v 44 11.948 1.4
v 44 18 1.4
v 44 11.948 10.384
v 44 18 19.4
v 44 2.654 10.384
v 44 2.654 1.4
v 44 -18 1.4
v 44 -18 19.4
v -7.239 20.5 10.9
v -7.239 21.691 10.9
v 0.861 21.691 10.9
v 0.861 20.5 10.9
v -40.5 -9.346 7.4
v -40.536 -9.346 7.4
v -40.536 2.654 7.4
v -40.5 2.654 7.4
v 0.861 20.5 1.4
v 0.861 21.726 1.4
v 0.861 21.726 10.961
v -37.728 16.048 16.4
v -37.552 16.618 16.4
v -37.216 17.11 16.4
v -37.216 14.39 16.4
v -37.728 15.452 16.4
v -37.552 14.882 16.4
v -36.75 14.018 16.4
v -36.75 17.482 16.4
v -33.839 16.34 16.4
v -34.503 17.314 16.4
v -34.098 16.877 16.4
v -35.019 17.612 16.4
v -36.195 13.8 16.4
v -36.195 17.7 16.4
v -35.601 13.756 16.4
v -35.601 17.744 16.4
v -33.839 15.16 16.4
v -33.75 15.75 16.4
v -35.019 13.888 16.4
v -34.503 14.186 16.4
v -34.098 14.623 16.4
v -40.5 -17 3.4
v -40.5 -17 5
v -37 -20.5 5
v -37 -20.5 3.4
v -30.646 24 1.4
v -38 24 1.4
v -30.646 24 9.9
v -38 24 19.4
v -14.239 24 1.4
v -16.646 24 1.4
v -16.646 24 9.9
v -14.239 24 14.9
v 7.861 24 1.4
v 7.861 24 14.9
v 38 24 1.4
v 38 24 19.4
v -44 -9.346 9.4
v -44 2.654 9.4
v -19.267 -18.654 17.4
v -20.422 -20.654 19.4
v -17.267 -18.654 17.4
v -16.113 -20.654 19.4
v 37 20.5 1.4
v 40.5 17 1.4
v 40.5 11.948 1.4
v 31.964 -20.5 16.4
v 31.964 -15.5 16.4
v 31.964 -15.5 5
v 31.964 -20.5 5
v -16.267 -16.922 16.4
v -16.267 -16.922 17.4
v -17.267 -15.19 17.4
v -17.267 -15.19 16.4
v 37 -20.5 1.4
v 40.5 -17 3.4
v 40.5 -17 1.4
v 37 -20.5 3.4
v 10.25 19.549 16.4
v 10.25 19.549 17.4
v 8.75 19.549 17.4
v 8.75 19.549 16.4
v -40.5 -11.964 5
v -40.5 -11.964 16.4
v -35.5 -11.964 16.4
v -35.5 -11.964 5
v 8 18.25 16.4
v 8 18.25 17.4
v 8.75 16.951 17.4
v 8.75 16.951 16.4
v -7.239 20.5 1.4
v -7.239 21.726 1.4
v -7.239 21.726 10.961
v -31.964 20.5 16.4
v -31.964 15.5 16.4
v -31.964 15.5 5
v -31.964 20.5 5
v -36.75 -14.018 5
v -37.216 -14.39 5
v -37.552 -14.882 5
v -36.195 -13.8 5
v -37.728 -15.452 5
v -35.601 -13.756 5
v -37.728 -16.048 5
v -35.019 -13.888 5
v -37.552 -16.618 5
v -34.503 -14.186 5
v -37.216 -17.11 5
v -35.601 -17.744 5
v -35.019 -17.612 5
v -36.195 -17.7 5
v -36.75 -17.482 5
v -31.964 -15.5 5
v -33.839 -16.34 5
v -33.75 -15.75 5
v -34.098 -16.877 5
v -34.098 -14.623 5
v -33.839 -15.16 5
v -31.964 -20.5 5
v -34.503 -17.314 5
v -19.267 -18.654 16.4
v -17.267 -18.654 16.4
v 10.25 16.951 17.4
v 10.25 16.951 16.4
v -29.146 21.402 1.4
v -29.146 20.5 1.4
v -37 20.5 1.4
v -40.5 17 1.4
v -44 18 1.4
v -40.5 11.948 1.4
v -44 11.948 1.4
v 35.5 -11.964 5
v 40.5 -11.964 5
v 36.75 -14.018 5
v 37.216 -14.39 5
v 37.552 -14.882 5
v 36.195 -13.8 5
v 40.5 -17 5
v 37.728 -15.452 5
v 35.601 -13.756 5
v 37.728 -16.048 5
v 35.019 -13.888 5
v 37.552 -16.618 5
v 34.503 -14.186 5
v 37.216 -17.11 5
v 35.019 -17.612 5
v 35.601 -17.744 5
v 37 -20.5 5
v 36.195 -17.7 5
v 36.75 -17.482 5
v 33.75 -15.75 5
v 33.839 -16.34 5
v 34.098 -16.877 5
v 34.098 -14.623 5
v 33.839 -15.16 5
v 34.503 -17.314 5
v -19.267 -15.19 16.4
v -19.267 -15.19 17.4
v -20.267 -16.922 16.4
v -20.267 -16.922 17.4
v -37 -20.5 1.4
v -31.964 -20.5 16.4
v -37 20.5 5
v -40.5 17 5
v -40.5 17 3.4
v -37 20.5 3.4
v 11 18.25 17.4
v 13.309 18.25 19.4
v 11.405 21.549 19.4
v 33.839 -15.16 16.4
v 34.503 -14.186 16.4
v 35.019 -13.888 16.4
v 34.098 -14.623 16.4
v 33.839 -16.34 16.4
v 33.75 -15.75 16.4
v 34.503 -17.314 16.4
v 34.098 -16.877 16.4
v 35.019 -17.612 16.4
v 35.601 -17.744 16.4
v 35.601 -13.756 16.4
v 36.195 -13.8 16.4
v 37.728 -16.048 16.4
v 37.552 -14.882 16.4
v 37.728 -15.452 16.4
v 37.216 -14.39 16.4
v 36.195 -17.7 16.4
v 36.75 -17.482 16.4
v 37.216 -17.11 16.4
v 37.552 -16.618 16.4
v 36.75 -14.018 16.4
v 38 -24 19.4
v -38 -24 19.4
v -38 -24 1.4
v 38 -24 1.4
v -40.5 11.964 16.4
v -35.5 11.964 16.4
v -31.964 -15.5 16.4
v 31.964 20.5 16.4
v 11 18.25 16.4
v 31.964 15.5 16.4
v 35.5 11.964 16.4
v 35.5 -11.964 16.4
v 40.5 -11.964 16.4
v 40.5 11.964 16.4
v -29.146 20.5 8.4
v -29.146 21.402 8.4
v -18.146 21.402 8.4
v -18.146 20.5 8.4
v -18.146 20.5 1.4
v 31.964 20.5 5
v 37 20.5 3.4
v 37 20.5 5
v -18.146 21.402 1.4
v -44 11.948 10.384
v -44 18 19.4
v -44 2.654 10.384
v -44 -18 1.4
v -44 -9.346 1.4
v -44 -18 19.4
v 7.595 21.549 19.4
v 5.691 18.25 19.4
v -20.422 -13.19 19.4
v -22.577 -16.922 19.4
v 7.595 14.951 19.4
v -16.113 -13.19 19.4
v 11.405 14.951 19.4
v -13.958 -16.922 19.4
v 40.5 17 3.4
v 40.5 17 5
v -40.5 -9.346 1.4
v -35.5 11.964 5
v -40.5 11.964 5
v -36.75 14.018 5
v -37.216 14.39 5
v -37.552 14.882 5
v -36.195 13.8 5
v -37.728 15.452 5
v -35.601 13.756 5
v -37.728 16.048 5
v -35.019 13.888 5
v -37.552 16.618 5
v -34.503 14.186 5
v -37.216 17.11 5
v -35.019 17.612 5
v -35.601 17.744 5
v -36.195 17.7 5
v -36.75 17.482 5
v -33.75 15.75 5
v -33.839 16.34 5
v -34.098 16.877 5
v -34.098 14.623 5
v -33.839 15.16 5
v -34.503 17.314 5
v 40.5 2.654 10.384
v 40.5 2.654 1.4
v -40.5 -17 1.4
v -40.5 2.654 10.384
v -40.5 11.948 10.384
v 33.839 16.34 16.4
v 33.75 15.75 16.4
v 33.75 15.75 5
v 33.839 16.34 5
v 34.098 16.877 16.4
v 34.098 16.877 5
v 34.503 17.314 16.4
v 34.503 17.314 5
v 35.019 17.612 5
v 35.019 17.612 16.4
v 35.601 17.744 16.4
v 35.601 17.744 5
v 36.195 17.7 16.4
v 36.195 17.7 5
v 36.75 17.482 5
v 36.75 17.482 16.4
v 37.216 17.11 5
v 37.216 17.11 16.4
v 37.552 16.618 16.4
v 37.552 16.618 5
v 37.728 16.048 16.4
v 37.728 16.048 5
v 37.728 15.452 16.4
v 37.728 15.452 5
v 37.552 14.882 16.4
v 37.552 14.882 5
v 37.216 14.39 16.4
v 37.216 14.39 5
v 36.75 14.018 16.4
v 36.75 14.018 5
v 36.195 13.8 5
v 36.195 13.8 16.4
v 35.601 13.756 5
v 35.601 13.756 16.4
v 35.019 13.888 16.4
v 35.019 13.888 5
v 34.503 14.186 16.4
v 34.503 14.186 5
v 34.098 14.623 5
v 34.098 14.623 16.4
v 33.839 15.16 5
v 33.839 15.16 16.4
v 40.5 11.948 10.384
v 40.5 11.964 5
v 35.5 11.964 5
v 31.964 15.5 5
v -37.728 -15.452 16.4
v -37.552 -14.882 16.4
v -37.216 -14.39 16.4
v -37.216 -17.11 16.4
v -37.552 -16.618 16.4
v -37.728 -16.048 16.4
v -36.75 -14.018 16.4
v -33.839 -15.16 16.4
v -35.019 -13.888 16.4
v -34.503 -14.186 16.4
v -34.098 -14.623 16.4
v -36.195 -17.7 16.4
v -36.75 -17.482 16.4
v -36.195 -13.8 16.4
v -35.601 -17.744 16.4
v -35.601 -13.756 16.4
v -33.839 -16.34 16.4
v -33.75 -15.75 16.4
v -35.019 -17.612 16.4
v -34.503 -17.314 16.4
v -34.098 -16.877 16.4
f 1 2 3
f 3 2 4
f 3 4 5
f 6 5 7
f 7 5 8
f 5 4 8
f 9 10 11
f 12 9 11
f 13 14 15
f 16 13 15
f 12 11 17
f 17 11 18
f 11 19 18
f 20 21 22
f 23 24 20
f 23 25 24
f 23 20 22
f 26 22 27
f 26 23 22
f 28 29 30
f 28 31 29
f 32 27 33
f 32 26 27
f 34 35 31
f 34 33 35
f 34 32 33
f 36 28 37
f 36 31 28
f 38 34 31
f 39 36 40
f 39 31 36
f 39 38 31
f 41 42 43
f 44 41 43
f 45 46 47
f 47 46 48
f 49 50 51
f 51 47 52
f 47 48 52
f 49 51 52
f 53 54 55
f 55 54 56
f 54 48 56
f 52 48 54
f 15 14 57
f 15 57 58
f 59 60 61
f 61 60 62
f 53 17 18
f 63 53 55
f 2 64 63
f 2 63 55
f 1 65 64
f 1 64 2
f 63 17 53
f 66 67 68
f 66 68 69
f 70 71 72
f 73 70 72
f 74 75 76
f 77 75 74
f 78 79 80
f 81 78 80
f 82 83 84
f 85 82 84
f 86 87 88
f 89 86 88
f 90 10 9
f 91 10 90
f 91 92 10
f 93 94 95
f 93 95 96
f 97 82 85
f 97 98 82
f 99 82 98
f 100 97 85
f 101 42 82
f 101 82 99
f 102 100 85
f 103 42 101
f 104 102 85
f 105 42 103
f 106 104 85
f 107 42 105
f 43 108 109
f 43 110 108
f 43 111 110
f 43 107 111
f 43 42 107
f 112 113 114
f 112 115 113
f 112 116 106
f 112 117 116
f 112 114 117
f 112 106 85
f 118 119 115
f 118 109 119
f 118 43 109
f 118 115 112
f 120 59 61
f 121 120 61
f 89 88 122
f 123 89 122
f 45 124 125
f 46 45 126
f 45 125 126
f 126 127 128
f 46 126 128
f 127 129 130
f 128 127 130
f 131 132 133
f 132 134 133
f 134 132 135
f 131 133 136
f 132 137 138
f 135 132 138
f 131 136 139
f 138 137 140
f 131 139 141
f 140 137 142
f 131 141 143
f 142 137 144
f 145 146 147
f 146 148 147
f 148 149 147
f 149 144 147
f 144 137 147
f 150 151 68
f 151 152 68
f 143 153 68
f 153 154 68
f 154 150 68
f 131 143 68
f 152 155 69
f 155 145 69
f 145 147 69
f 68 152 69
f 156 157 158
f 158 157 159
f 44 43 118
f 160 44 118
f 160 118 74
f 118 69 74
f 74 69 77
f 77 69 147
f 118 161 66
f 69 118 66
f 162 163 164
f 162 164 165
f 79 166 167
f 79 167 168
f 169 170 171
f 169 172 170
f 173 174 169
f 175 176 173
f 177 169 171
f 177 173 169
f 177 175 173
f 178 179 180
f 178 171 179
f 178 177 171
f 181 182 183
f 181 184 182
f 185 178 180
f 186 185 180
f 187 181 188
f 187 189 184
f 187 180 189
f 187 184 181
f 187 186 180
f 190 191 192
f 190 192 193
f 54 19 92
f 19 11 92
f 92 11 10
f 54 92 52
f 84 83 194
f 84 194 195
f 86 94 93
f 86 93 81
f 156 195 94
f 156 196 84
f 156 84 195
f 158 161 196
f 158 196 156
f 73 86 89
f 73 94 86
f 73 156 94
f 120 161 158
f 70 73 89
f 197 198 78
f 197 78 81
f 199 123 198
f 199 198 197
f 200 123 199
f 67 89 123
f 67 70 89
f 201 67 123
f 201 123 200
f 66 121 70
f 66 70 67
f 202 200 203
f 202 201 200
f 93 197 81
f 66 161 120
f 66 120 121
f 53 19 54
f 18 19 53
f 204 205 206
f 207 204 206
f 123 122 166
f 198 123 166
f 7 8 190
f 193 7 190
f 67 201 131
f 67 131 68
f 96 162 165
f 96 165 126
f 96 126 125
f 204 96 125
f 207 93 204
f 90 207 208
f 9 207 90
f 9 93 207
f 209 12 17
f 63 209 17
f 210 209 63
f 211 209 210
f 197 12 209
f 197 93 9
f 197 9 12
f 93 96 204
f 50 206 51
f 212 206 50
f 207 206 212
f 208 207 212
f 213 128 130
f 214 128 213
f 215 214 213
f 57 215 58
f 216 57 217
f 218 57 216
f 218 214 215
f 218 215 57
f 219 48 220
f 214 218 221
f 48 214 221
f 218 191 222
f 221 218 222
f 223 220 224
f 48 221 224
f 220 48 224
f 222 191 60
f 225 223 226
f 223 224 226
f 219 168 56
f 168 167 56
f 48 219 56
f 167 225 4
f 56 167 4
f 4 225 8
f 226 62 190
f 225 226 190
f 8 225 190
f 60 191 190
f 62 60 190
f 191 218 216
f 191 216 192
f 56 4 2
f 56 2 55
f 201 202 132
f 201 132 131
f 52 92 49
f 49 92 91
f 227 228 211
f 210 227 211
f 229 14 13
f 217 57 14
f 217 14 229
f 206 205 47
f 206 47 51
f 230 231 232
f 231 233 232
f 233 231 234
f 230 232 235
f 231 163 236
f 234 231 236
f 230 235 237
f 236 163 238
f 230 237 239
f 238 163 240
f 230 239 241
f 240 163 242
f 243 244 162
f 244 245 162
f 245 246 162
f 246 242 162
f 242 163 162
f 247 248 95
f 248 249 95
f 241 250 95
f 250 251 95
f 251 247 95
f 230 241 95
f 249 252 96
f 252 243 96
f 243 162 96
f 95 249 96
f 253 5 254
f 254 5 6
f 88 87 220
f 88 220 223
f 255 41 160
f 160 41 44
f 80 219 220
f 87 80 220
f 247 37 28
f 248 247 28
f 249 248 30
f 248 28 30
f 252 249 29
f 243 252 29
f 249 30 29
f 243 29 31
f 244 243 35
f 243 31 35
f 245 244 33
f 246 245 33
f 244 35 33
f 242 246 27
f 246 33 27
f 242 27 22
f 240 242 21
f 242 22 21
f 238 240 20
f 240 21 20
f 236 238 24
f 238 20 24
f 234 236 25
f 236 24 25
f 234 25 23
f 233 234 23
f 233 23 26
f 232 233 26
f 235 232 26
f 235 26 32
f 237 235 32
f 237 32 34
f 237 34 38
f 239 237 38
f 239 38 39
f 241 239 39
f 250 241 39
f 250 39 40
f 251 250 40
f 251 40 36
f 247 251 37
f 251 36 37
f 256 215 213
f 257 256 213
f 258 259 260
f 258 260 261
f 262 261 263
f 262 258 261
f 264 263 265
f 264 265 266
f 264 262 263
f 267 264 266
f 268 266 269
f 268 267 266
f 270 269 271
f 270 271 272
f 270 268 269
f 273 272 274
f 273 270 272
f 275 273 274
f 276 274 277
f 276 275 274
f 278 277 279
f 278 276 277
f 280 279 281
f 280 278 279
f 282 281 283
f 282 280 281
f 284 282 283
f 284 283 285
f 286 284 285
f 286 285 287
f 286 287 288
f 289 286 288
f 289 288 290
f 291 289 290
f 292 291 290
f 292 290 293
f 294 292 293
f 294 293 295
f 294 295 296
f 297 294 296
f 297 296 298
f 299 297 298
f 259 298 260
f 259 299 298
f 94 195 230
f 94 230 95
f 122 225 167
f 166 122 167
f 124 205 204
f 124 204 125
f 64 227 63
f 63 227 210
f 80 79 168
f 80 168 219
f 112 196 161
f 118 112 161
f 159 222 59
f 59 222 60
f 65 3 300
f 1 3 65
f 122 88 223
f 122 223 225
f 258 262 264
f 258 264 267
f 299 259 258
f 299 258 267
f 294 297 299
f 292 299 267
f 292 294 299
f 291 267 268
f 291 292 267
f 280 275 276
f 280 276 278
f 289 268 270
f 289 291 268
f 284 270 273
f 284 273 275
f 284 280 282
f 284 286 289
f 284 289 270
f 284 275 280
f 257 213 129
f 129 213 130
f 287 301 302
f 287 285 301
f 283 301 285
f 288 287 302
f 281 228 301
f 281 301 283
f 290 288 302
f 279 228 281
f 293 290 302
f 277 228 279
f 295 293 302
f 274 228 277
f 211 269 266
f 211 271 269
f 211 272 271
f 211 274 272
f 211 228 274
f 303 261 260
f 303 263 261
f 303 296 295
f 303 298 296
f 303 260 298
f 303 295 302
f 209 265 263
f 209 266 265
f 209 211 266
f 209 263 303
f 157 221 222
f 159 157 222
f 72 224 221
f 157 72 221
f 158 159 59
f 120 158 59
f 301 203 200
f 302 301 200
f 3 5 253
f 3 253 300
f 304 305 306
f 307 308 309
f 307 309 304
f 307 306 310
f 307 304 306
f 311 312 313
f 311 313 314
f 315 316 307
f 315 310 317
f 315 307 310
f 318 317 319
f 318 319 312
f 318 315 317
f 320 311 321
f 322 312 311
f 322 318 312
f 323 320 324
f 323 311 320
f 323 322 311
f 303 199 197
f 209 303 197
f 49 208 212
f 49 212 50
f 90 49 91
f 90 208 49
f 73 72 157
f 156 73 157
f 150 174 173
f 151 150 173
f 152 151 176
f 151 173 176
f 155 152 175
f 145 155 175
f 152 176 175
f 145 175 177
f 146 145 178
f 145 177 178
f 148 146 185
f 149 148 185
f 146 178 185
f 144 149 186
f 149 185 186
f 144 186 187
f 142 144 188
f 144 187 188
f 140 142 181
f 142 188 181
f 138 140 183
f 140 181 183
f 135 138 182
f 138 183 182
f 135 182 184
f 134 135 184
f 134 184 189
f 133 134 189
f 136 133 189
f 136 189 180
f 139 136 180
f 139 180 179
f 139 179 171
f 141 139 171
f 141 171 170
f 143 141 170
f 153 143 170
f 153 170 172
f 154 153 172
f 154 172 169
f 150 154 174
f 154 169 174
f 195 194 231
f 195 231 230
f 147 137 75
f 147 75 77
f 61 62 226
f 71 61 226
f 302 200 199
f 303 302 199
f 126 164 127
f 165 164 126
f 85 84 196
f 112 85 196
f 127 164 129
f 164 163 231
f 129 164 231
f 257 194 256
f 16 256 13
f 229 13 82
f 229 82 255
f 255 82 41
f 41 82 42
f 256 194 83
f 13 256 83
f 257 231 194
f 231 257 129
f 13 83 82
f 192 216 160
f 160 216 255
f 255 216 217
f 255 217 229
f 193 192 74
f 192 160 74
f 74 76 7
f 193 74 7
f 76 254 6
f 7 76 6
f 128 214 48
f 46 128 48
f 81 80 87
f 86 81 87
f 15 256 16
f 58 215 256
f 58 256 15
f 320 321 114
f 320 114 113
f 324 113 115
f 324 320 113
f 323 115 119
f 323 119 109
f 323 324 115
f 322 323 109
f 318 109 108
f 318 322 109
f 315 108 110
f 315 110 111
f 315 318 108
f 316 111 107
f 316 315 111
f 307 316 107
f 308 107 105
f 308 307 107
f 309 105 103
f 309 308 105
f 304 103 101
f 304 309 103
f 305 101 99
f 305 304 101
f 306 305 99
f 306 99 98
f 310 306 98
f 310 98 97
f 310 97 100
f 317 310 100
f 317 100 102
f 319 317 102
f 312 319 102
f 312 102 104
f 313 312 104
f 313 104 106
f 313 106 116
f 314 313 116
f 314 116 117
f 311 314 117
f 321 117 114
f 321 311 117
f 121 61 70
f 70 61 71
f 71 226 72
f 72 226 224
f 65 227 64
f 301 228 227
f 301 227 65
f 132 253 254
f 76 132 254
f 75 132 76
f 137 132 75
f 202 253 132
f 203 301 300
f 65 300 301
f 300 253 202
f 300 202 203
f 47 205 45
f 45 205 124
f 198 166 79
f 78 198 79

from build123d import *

# Parameters (mm, degrees)
SKETCH_W                      = 88
SKETCH_H                      = 48
PAD_DEPTH                     = 3
SKETCH001_W                   = 88
SKETCH001_H                   = 48
SKETCH001_W_2                 = 81
SKETCH001_H_2                 = 41
PAD001_DEPTH                  = 15
SKETCH002_R                   = 2
PAD002_DEPTH                  = 11.4
SKETCH002_MIRRORED_2_R        = 2
PAD002_MIRRORED_2_DEPTH       = 11.4
SKETCH003_W                   = 9.293619
SKETCH003_H                   = 8.984104
POCKET_DEPTH                  = 5
SKETCH004_W                   = 8.1
SKETCH004_H                   = 9.5
POCKET001_DEPTH               = 5
CHAMFER_ANGLE                 = 18
CHAMFER_SIZE                  = 7
CHAMFER001_ANGLE              = 30
CHAMFER001_SIZE               = 4
SKETCH005_W                   = 11
SKETCH005_H                   = 7
POCKET002_DEPTH               = 5
CHAMFER002_ANGLE              = 60
CHAMFER002_SIZE               = 1.5
PAD003_DEPTH                  = 1.6
PAD003_MIRRORED003_2_DEPTH    = 1.6
POCKET003_DEPTH               = 5
CHAMFER003_SIZE               = 2
POCKET004_DEPTH               = 5
CHAMFER004_SIZE               = 2
SKETCH009_W                   = 12
SKETCH009_H                   = 6
POCKET005_DEPTH               = 5
CHAMFER005_ANGLE              = 60
CHAMFER005_SIZE               = 2
POCKET006_DEPTH               = 221.6870329036
POCKET006_MIRRORED005_2_DEPTH = 221.6870329036
PAD004_DEPTH                  = 2
PAD004_MIRRORED007_2_DEPTH    = 2
BODY_PLACEMENT_ANGLE          = 180


with BuildPart() as part:
    # Sketch → Pad (new body)
    with BuildSketch(Plane.XY):
        Rectangle(SKETCH_W, SKETCH_H)
    extrude(amount=PAD_DEPTH)

    # Sketch001 (on Face6 of Pad) → Pad001 (join)
    with BuildSketch(Plane.XY.offset(3)):
        Rectangle(SKETCH001_W, SKETCH001_H)
        Rectangle(SKETCH001_W_2, SKETCH001_H_2, mode=Mode.SUBTRACT)
    extrude(amount=PAD001_DEPTH)

    # Sketch002 (on Face15 of Pad001) → Pad002 (join)
    with BuildSketch(Plane.XY.offset(3)):
        Polygon((-31.964466094, 15.5), (-31.964466094, 20.5), (-40.5, 20.5), (-40.5, 11.9644660941), (-35.5, 11.9644660941), align=None)
        with Locations((-35.75, 15.75)):
            Circle(SKETCH002_R, mode=Mode.SUBTRACT)
    pad002 = extrude(amount=PAD002_DEPTH)

    # Sketch002 Mirrored 2 → Pad002 Mirrored 2 (add)
    with BuildSketch(Plane(origin=(0, 0, 3), x_dir=(-1, 0, 0), z_dir=(0, 0, -1))):
        Polygon((-31.964466094, 15.5), (-31.964466094, 20.5), (-40.5, 20.5), (-40.5, 11.9644660941), (-35.5, 11.9644660941), align=None)
        with Locations((-35.75, 15.75)):
            Circle(SKETCH002_MIRRORED_2_R, mode=Mode.SUBTRACT)
    pad002_mirrored_2 = extrude(amount=-PAD002_MIRRORED_2_DEPTH)

    # Mirrored001: Pad002, Pad002 Mirrored 2 across Sketch002 H_Axis
    add(pad002.mirror(Plane(origin=(0, 0, 3), x_dir=(0, 0, 1), z_dir=(0, 1, 0))))
    add(pad002_mirrored_2.mirror(Plane(origin=(0, 0, 3), x_dir=(0, 0, 1), z_dir=(0, 1, 0))))

    # Sketch003 (on Face7 of MultiTransform) → Pocket (cut)
    with BuildSketch(Plane(origin=(-44, 0, 0), x_dir=(0, -1, 0), z_dir=(-1, 0, 0))):
        with Locations((7.3011175, 13.507948)):
            Rectangle(SKETCH003_W, SKETCH003_H)
    pocket = extrude(amount=-POCKET_DEPTH, mode=Mode.SUBTRACT)

    # Mirrored002: Pocket across YZ
    add(pocket.mirror(Plane.YZ), mode=Mode.SUBTRACT)

    # Sketch004 (on Face5 of Mirrored002) → Pocket001 (cut)
    with BuildSketch(Plane.XZ.offset(24)):
        with Locations((-3.188932, 13.25)):
            Rectangle(SKETCH004_W, SKETCH004_H)
    extrude(amount=-POCKET001_DEPTH, mode=Mode.SUBTRACT)

    # Chamfer
    chamfer_edges = [part.edges().sort_by_distance(p)[0] for p in [
        (0.861068, -24, 13.25),
        (-7.238932, -24, 13.25),
    ]]
    chamfer_side = part.faces().sort_by_distance((0, -24, 3.892693))[0]
    chamfer(chamfer_edges, length=CHAMFER_SIZE, angle=CHAMFER_ANGLE, reference=chamfer_side)

    # Chamfer001
    chamfer001_edges = [part.edges().sort_by_distance(p)[0] for p in [
        (-3.188932, -24, 8.5),
        (-10.738932, -24, 8.5),
        (4.361068, -24, 8.5),
    ]]
    chamfer001_side = part.faces().sort_by_distance((-29.119466, -24, 17.107307))[0]
    chamfer(chamfer001_edges, length=CHAMFER001_SIZE, angle=CHAMFER001_ANGLE, reference=chamfer001_side)

    # Sketch005 (on Face1 of Chamfer001) → Pocket002 (cut)
    with BuildSketch(Plane.XZ.offset(24)):
        with Locations((-23.6462903219, 14.5)):
            Rectangle(SKETCH005_W, SKETCH005_H)
    extrude(amount=-POCKET002_DEPTH, mode=Mode.SUBTRACT)

    # Chamfer002
    chamfer002_edges = [part.edges().sort_by_distance(p)[0] for p in [
        (-23.64629, -24, 11),
        (-18.14629, -24, 14.5),
        (-29.14629, -24, 14.5),
    ]]
    chamfer002_side = part.faces().sort_by_distance((-10.738932, -24, 3.607307))[0]
    chamfer(chamfer002_edges, length=CHAMFER002_SIZE, angle=CHAMFER002_ANGLE, reference=chamfer002_side)

    # Sketch006 (on Face38 of Chamfer002) → Pad003 (join)
    with BuildSketch(Plane.XY.offset(14.4)):
        Polygon((-40.5, 20.5), (-40.5, 17.0000000001), (-37, 20.5), align=None)
    pad003 = extrude(amount=PAD003_DEPTH)

    # Sketch006 Mirrored003 2 → Pad003 Mirrored003 2 (add)
    with BuildSketch(Plane(origin=(0, 0, 14.4), x_dir=(-1, 0, 0), z_dir=(0, 0, -1))):
        Polygon((-40.5, 20.5), (-40.5, 17.0000000001), (-37, 20.5), align=None)
    pad003_mirrored003_2 = extrude(amount=-PAD003_MIRRORED003_2_DEPTH)

    # Mirrored004: Pad003, Pad003 Mirrored003 2 across Sketch006 H_Axis
    add(pad003.mirror(Plane(origin=(0, 0, 14.4), x_dir=(0, 0, 1), z_dir=(0, 1, 0))))
    add(pad003_mirrored003_2.mirror(Plane(origin=(0, 0, 14.4), x_dir=(0, 0, 1), z_dir=(0, 1, 0))))

    # Sketch007 (on Face27 of MultiTransform001) → Pocket003 (cut)
    with BuildSketch(Plane(origin=(0, 0, 0), x_dir=(1, 0, 0), z_dir=(0, 0, -1))):
        Polygon((-16.267433, -16.921766), (-17.267433, -15.1897151924), (-19.267433, -15.1897151924), (-20.267433, -16.921766), (-19.267433, -18.6538168076), (-17.267433, -18.6538168076), align=None)
    extrude(amount=-POCKET003_DEPTH, mode=Mode.SUBTRACT)

    # Chamfer003
    chamfer003_edges = [part.edges().sort_by_distance(p)[0] for p in [
        (-18.267433, 15.189715, 0),
        (-16.767433, 16.055741, 0),
        (-16.767433, 17.787791, 0),
        (-18.267433, 18.653817, 0),
        (-19.767433, 17.787791, 0),
        (-19.767433, 16.055741, 0),
    ]]
    chamfer(chamfer003_edges, length=CHAMFER003_SIZE)

    # Sketch008 (on Face1 of Chamfer003) → Pocket004 (cut)
    with BuildSketch(Plane(origin=(0, 0, 0), x_dir=(1, 0, 0), z_dir=(0, 0, -1))):
        Polygon((11, 18.25), (10.25, 19.5490381057), (8.75, 19.5490381057), (8, 18.25), (8.75, 16.9509618943), (10.25, 16.9509618943), align=None)
    extrude(amount=-POCKET004_DEPTH, mode=Mode.SUBTRACT)

    # Chamfer004
    chamfer004_edges = [part.edges().sort_by_distance(p)[0] for p in [
        (9.5, -19.549038, 0),
        (8.375, -18.899519, 0),
        (8.375, -17.600481, 0),
        (9.5, -16.950962, 0),
        (10.625, -17.600481, 0),
        (10.625, -18.899519, 0),
    ]]
    chamfer(chamfer004_edges, length=CHAMFER004_SIZE)

    # Sketch009 (on Face25 of Chamfer004) → Pocket005 (cut)
    with BuildSketch(Plane(origin=(-44, 0, 0), x_dir=(0, -1, 0), z_dir=(-1, 0, 0))):
        with Locations((-3.345692, 15)):
            Rectangle(SKETCH009_W, SKETCH009_H)
    extrude(amount=-POCKET005_DEPTH, mode=Mode.SUBTRACT)

    # Chamfer005
    chamfer005_edges = [part.edges().sort_by_distance(p)[0] for p in [
        (-44, 3.345692, 12),
    ]]
    chamfer005_side = part.faces().sort_by_distance((-44, 0.653166, 9.481146))[0]
    chamfer(chamfer005_edges, length=CHAMFER005_SIZE, angle=CHAMFER005_ANGLE, reference=chamfer005_side)

    # Sketch010 (on Face32 of Chamfer005) → Pocket006 (cut, through all)
    with BuildSketch(Plane(origin=(0, 0, 0), x_dir=(1, 0, 0), z_dir=(0, 0, -1))):
        Polygon((38, 24), (44, 24), (44, 18), align=None)
    pocket006 = extrude(amount=-POCKET006_DEPTH, mode=Mode.SUBTRACT)

    # Sketch010 Mirrored005 2 → Pocket006 Mirrored005 2 (cut, through all)
    with BuildSketch(Plane(origin=(0, 0, 0), x_dir=(-1, 0, 0), z_dir=(0, 0, 1))):
        Polygon((38, 24), (44, 24), (44, 18), align=None)
    pocket006_mirrored005_2 = extrude(amount=POCKET006_MIRRORED005_2_DEPTH, mode=Mode.SUBTRACT)

    # Mirrored006: Pocket006, Pocket006 Mirrored005 2 across Sketch010 H_Axis
    add(pocket006.mirror(Plane(origin=(0, 0, 0), x_dir=(0, 0, -1), z_dir=(0, -1, 0))), mode=Mode.SUBTRACT)
    add(pocket006_mirrored005_2.mirror(Plane(origin=(0, 0, 0), x_dir=(0, 0, -1), z_dir=(0, -1, 0))), mode=Mode.SUBTRACT)

    # Sketch011 (on Face32 of MultiTransform002) → Pad004 (join)
    with BuildSketch(Plane.XY.offset(16)):
        Polygon((-40.5, -20.5), (-40.5, -17.0000000001), (-37.0000000001, -20.5), align=None)
    pad004 = extrude(amount=PAD004_DEPTH)

    # Sketch011 Mirrored007 2 → Pad004 Mirrored007 2 (add)
    with BuildSketch(Plane(origin=(0, 0, 16), x_dir=(-1, 0, 0), z_dir=(0, 0, -1))):
        Polygon((-40.5, -20.5), (-40.5, -17.0000000001), (-37.0000000001, -20.5), align=None)
    pad004_mirrored007_2 = extrude(amount=-PAD004_MIRRORED007_2_DEPTH)

    # Mirrored008: Pad004, Pad004 Mirrored007 2 across Sketch011 H_Axis
    add(pad004.mirror(Plane(origin=(0, 0, 16), x_dir=(0, 0, 1), z_dir=(0, 1, 0))))
    add(pad004_mirrored007_2.mirror(Plane(origin=(0, 0, 16), x_dir=(0, 0, 1), z_dir=(0, 1, 0))))


with BuildPart() as part_1:
    # Body placement: moved
    add(part.part.moved(Location((0, 0, 19.4))).rotate(Axis((0, 0, 19.4), (1, 0, 0)), BODY_PLACEMENT_ANGLE))


solid = part_1.part
